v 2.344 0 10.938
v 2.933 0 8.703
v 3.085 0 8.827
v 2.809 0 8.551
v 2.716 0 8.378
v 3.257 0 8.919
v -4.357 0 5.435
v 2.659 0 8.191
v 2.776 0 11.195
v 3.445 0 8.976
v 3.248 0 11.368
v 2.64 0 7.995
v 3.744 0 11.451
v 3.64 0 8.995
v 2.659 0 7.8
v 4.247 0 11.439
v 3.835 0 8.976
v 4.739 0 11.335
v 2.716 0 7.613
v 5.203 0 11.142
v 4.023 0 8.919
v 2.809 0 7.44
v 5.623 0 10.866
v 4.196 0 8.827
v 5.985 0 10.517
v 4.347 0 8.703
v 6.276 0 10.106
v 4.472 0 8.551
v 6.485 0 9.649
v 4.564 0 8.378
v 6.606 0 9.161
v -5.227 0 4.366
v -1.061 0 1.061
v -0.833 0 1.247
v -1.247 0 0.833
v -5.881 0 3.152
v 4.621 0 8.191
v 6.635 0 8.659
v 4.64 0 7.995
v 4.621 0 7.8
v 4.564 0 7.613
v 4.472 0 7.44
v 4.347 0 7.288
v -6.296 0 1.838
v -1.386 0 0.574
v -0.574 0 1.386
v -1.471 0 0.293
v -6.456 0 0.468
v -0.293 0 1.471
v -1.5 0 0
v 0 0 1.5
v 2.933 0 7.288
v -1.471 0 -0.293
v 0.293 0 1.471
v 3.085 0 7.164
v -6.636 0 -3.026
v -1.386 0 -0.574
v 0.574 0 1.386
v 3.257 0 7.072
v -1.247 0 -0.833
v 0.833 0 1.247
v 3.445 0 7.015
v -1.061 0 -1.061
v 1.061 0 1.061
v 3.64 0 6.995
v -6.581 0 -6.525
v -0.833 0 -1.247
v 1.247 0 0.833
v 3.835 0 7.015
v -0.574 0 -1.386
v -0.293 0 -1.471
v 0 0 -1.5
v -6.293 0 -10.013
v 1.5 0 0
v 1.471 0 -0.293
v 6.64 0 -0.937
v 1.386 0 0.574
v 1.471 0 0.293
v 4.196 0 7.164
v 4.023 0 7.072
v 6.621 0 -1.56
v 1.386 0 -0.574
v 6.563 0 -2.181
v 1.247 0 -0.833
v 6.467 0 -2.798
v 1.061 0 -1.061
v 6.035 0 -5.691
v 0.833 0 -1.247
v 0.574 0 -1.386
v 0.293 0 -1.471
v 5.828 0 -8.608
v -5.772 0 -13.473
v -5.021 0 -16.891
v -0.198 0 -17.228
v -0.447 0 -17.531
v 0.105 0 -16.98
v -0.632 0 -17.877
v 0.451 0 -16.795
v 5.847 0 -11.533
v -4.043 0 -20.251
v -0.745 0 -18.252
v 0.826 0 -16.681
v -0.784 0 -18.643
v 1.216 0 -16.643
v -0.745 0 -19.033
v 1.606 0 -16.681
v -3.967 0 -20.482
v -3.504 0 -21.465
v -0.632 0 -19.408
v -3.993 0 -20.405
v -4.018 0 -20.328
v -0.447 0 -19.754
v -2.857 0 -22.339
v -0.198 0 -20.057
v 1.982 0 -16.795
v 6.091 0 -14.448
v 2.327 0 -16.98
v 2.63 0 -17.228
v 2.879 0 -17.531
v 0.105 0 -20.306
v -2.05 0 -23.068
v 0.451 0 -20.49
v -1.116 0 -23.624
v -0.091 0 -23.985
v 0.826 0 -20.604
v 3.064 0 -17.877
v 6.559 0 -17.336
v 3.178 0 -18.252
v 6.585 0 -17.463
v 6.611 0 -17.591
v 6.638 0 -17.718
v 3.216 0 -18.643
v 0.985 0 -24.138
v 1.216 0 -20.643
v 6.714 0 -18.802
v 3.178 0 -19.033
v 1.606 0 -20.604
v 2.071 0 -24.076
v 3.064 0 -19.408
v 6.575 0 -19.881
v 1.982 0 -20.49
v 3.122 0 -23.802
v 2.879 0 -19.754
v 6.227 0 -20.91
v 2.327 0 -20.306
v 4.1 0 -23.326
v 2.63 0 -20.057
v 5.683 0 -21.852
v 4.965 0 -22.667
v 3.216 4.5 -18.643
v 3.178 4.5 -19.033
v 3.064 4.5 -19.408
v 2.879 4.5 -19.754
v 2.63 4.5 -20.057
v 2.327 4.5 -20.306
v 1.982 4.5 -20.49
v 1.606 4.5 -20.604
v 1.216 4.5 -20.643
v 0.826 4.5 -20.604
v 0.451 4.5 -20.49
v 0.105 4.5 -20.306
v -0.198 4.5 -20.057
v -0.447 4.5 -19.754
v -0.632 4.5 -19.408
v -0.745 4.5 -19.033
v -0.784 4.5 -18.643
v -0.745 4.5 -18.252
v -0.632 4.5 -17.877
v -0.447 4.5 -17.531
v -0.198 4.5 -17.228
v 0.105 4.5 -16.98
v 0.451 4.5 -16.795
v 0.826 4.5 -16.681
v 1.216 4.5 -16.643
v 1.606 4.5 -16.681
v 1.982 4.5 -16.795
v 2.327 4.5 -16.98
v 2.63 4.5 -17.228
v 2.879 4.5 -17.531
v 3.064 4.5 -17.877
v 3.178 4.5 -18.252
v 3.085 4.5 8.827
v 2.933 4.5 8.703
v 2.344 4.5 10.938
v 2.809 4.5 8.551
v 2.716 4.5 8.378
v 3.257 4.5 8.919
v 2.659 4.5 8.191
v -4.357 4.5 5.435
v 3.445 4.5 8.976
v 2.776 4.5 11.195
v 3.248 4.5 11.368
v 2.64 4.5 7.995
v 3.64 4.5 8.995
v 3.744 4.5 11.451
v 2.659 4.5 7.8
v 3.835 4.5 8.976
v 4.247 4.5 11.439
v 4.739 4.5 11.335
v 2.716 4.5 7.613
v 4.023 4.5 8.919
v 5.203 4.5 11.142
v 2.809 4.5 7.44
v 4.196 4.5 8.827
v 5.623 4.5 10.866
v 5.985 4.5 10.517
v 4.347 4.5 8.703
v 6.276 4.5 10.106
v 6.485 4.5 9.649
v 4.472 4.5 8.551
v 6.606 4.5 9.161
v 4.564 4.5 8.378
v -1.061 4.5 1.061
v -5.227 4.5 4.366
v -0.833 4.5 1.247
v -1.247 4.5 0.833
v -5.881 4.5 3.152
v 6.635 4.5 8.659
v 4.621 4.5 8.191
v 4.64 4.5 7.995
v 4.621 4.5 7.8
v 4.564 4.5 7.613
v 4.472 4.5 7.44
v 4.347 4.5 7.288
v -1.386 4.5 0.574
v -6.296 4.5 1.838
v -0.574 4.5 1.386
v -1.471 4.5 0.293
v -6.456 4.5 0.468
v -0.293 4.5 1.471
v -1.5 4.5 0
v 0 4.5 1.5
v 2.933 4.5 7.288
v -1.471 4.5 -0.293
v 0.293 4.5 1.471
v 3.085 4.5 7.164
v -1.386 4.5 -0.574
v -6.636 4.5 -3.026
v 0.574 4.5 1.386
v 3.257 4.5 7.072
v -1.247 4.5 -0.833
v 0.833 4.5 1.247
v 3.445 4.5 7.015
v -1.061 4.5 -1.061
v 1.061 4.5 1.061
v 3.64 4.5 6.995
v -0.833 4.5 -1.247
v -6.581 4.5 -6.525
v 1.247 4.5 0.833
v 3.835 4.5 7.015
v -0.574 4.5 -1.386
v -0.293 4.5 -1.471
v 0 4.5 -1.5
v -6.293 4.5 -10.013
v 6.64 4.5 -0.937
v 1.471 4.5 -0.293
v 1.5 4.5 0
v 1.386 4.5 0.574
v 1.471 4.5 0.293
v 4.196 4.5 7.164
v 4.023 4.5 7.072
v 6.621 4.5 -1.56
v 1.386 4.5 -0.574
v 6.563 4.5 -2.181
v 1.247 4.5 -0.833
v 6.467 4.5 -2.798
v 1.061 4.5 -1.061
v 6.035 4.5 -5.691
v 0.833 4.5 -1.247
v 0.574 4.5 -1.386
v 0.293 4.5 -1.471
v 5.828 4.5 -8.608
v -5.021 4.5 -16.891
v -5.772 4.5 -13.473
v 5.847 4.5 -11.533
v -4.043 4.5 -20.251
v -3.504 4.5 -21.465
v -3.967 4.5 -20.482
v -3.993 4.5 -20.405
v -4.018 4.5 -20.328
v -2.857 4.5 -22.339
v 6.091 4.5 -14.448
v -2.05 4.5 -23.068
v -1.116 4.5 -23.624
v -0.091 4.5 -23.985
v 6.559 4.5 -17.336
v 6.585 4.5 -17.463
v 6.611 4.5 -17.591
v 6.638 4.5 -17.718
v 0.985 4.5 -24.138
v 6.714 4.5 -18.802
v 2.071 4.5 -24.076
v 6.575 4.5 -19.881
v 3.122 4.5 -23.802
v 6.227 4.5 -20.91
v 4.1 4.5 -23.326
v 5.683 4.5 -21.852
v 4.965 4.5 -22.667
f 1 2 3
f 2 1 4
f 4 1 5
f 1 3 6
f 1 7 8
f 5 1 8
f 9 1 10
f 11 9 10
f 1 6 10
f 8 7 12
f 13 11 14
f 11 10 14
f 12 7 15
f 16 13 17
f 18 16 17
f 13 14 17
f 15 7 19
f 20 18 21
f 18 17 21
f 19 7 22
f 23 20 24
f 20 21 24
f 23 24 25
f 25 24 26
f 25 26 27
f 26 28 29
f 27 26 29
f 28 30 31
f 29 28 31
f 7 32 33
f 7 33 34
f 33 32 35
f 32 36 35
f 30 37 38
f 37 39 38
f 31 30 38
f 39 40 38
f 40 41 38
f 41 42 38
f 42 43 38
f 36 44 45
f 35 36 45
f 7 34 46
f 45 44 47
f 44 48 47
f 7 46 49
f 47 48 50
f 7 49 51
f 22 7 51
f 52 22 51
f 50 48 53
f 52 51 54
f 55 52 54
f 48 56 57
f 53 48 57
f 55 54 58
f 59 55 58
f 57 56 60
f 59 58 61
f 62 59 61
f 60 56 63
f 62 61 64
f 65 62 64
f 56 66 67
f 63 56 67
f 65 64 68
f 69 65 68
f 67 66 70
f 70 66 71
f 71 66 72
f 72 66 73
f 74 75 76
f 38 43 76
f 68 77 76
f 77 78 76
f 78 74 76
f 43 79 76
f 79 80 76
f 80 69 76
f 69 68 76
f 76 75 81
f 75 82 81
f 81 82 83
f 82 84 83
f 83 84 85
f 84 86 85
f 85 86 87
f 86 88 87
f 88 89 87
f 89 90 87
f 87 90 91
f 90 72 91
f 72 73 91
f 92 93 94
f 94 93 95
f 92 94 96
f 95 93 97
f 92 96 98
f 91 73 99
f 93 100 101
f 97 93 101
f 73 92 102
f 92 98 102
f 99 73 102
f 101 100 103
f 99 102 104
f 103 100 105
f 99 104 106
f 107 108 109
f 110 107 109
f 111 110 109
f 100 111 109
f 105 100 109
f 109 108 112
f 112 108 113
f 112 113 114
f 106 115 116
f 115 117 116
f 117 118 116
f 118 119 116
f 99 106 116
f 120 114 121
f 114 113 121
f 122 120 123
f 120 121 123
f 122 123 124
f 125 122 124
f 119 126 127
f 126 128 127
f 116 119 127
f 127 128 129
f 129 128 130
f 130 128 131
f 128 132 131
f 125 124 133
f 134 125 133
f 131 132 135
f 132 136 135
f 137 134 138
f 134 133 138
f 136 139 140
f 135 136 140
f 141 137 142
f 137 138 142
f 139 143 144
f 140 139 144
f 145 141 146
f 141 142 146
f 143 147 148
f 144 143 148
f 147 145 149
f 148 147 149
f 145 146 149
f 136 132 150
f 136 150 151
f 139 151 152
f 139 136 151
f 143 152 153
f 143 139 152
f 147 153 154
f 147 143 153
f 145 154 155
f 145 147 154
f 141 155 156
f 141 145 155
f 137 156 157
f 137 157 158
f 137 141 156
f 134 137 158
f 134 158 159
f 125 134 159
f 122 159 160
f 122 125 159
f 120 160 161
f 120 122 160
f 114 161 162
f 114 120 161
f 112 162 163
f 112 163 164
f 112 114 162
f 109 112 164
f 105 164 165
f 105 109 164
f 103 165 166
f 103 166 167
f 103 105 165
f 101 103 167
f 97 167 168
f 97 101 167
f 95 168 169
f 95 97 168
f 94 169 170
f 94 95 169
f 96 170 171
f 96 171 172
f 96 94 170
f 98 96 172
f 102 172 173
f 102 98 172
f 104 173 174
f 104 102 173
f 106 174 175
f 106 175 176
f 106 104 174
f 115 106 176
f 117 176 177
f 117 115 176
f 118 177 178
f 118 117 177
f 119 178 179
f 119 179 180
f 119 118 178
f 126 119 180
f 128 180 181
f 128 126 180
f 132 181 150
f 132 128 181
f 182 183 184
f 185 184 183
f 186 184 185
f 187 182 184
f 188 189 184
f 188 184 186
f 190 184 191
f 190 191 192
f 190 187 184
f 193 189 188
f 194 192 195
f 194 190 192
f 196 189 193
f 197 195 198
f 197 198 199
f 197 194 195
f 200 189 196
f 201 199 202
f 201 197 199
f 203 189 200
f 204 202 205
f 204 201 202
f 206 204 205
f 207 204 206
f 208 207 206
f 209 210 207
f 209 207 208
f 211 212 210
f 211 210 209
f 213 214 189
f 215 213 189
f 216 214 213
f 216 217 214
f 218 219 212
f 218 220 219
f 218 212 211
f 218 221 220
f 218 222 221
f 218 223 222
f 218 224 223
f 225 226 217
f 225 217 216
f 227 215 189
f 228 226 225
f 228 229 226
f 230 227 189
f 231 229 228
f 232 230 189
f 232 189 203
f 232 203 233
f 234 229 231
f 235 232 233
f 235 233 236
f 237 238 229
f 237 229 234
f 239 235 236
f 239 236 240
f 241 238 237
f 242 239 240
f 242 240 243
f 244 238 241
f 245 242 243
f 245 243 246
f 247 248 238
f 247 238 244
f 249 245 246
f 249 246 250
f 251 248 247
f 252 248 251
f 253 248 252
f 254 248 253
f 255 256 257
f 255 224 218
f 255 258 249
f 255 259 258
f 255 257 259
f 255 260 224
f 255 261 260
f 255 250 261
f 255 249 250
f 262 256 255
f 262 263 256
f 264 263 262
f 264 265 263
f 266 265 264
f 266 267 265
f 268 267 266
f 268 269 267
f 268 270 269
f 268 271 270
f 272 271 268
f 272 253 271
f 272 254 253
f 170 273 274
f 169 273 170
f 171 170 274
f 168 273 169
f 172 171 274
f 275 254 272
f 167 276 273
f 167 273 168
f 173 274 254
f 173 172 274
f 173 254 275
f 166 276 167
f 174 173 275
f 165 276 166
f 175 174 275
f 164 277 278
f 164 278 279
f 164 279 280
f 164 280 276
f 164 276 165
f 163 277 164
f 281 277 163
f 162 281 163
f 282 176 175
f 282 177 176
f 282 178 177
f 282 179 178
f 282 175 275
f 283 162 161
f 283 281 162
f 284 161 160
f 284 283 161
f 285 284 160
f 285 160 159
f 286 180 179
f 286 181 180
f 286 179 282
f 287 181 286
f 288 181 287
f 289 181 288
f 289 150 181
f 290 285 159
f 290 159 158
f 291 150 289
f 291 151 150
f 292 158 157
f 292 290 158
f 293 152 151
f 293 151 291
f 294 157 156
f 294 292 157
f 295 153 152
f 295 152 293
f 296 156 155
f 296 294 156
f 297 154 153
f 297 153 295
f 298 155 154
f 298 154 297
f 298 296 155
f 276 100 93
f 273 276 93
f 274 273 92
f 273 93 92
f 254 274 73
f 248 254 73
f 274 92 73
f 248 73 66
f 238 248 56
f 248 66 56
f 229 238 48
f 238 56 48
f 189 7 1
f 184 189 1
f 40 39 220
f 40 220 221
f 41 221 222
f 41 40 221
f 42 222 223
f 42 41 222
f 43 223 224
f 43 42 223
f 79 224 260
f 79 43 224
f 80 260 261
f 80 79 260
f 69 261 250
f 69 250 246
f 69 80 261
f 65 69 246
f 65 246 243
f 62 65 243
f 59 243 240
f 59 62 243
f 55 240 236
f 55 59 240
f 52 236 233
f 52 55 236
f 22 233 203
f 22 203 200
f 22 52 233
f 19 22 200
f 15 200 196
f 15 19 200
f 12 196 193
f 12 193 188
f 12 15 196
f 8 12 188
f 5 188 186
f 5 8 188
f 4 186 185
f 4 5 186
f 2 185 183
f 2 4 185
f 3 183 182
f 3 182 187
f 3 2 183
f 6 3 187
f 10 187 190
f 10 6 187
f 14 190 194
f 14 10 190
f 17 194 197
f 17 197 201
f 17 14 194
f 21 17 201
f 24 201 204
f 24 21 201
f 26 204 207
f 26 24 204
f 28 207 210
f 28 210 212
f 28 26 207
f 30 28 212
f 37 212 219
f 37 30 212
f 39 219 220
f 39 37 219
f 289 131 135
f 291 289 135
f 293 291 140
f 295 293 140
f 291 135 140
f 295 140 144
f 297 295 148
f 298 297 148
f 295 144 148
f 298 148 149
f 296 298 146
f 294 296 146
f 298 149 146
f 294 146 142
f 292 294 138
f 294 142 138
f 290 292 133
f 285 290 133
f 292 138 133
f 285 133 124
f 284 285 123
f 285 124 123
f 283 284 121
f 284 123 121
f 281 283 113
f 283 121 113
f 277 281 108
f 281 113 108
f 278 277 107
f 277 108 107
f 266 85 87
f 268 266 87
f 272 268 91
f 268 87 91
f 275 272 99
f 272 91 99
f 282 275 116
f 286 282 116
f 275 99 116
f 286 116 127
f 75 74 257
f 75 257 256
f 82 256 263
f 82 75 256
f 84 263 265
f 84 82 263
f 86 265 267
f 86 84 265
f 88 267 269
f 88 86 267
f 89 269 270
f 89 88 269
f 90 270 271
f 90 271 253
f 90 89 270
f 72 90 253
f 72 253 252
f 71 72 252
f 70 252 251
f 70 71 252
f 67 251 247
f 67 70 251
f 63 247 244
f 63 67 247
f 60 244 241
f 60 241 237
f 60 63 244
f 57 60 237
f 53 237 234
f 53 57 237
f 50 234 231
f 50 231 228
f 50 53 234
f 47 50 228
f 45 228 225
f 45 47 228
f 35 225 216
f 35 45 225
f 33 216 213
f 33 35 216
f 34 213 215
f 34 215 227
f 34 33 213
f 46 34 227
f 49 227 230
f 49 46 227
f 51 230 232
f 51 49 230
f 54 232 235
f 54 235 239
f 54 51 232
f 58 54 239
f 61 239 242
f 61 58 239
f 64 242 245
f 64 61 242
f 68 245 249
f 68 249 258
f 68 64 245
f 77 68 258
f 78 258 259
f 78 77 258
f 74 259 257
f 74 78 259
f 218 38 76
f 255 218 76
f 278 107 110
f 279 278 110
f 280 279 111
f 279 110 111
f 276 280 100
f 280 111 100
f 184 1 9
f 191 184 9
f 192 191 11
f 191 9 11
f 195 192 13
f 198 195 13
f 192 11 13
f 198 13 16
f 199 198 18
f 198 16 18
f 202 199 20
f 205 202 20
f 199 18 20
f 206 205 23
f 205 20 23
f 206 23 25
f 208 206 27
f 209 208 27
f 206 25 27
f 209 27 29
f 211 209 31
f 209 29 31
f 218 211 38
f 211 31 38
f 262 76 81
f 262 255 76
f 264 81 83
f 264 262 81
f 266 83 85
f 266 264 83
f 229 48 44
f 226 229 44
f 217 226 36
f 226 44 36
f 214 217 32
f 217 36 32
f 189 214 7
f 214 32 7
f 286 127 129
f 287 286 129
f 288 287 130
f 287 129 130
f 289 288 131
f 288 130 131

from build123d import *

# Parameters (mm, degrees)
SKETCH1_R           = 1.5
SKETCH1_R_2         = 1
SKETCH1_R_3         = 2
BOSS_EXTRUDE1_DEPTH = 4.5
FILLET1_R           = 10


with BuildPart() as part:
    # Sketch1 → Boss-Extrude1 (new body)
    with BuildSketch(Plane(origin=(0, 0, 0), x_dir=(1, 0, 0), z_dir=(0, 1, 0))):
        with BuildLine():
            ThreePointArc((-6.456463654, -0.468407199), (-5.880915222, -3.152272765), (-4.357266756, -5.43544725))
            Line((-4.357266756, -5.43544725), (2.344258018, -10.938071213))
            ThreePointArc((2.344258018, -10.938071213), (5.202990751, -11.141955791), (6.634993867, -8.659358597))
            Line((6.634993867, -8.659358597), (6.640943349, 1.930649732))
            ThreePointArc((6.640943349, 1.930649732), (5.809058186, 9.628967625), (6.558640267, 17.335734652))
            ThreePointArc((6.558640267, 17.335734652), (6.597770339, 17.526968722), (6.637884512, 17.717998785))
            ThreePointArc((6.637884512, 17.717998785), (2.603251894, 23.964804241), (-3.96716661, 20.4819262))
            ThreePointArc((-3.96716661, 20.4819262), (-4.005352419, 20.366730432), (-4.043270963, 20.251446412))
            ThreePointArc((-4.043270963, 20.251446412), (-6.29279682, 10.012987158), (-6.456463654, -0.468407199))
        make_face()
        Circle(SKETCH1_R, mode=Mode.SUBTRACT)
        with Locations((3.64018052, -7.995416238)):
            Circle(SKETCH1_R_2, mode=Mode.SUBTRACT)
        with Locations((1.216156784, 18.642589744)):
            Circle(SKETCH1_R_3, mode=Mode.SUBTRACT)
    extrude(amount=BOSS_EXTRUDE1_DEPTH)

    # Fillet1
    fillet1_edges = [part.edges().sort_by_distance(p)[0] for p in [
        (6.640943349, 2.25, -1.930649732),
    ]]
    fillet(fillet1_edges, radius=FILLET1_R)


solid = part.part
